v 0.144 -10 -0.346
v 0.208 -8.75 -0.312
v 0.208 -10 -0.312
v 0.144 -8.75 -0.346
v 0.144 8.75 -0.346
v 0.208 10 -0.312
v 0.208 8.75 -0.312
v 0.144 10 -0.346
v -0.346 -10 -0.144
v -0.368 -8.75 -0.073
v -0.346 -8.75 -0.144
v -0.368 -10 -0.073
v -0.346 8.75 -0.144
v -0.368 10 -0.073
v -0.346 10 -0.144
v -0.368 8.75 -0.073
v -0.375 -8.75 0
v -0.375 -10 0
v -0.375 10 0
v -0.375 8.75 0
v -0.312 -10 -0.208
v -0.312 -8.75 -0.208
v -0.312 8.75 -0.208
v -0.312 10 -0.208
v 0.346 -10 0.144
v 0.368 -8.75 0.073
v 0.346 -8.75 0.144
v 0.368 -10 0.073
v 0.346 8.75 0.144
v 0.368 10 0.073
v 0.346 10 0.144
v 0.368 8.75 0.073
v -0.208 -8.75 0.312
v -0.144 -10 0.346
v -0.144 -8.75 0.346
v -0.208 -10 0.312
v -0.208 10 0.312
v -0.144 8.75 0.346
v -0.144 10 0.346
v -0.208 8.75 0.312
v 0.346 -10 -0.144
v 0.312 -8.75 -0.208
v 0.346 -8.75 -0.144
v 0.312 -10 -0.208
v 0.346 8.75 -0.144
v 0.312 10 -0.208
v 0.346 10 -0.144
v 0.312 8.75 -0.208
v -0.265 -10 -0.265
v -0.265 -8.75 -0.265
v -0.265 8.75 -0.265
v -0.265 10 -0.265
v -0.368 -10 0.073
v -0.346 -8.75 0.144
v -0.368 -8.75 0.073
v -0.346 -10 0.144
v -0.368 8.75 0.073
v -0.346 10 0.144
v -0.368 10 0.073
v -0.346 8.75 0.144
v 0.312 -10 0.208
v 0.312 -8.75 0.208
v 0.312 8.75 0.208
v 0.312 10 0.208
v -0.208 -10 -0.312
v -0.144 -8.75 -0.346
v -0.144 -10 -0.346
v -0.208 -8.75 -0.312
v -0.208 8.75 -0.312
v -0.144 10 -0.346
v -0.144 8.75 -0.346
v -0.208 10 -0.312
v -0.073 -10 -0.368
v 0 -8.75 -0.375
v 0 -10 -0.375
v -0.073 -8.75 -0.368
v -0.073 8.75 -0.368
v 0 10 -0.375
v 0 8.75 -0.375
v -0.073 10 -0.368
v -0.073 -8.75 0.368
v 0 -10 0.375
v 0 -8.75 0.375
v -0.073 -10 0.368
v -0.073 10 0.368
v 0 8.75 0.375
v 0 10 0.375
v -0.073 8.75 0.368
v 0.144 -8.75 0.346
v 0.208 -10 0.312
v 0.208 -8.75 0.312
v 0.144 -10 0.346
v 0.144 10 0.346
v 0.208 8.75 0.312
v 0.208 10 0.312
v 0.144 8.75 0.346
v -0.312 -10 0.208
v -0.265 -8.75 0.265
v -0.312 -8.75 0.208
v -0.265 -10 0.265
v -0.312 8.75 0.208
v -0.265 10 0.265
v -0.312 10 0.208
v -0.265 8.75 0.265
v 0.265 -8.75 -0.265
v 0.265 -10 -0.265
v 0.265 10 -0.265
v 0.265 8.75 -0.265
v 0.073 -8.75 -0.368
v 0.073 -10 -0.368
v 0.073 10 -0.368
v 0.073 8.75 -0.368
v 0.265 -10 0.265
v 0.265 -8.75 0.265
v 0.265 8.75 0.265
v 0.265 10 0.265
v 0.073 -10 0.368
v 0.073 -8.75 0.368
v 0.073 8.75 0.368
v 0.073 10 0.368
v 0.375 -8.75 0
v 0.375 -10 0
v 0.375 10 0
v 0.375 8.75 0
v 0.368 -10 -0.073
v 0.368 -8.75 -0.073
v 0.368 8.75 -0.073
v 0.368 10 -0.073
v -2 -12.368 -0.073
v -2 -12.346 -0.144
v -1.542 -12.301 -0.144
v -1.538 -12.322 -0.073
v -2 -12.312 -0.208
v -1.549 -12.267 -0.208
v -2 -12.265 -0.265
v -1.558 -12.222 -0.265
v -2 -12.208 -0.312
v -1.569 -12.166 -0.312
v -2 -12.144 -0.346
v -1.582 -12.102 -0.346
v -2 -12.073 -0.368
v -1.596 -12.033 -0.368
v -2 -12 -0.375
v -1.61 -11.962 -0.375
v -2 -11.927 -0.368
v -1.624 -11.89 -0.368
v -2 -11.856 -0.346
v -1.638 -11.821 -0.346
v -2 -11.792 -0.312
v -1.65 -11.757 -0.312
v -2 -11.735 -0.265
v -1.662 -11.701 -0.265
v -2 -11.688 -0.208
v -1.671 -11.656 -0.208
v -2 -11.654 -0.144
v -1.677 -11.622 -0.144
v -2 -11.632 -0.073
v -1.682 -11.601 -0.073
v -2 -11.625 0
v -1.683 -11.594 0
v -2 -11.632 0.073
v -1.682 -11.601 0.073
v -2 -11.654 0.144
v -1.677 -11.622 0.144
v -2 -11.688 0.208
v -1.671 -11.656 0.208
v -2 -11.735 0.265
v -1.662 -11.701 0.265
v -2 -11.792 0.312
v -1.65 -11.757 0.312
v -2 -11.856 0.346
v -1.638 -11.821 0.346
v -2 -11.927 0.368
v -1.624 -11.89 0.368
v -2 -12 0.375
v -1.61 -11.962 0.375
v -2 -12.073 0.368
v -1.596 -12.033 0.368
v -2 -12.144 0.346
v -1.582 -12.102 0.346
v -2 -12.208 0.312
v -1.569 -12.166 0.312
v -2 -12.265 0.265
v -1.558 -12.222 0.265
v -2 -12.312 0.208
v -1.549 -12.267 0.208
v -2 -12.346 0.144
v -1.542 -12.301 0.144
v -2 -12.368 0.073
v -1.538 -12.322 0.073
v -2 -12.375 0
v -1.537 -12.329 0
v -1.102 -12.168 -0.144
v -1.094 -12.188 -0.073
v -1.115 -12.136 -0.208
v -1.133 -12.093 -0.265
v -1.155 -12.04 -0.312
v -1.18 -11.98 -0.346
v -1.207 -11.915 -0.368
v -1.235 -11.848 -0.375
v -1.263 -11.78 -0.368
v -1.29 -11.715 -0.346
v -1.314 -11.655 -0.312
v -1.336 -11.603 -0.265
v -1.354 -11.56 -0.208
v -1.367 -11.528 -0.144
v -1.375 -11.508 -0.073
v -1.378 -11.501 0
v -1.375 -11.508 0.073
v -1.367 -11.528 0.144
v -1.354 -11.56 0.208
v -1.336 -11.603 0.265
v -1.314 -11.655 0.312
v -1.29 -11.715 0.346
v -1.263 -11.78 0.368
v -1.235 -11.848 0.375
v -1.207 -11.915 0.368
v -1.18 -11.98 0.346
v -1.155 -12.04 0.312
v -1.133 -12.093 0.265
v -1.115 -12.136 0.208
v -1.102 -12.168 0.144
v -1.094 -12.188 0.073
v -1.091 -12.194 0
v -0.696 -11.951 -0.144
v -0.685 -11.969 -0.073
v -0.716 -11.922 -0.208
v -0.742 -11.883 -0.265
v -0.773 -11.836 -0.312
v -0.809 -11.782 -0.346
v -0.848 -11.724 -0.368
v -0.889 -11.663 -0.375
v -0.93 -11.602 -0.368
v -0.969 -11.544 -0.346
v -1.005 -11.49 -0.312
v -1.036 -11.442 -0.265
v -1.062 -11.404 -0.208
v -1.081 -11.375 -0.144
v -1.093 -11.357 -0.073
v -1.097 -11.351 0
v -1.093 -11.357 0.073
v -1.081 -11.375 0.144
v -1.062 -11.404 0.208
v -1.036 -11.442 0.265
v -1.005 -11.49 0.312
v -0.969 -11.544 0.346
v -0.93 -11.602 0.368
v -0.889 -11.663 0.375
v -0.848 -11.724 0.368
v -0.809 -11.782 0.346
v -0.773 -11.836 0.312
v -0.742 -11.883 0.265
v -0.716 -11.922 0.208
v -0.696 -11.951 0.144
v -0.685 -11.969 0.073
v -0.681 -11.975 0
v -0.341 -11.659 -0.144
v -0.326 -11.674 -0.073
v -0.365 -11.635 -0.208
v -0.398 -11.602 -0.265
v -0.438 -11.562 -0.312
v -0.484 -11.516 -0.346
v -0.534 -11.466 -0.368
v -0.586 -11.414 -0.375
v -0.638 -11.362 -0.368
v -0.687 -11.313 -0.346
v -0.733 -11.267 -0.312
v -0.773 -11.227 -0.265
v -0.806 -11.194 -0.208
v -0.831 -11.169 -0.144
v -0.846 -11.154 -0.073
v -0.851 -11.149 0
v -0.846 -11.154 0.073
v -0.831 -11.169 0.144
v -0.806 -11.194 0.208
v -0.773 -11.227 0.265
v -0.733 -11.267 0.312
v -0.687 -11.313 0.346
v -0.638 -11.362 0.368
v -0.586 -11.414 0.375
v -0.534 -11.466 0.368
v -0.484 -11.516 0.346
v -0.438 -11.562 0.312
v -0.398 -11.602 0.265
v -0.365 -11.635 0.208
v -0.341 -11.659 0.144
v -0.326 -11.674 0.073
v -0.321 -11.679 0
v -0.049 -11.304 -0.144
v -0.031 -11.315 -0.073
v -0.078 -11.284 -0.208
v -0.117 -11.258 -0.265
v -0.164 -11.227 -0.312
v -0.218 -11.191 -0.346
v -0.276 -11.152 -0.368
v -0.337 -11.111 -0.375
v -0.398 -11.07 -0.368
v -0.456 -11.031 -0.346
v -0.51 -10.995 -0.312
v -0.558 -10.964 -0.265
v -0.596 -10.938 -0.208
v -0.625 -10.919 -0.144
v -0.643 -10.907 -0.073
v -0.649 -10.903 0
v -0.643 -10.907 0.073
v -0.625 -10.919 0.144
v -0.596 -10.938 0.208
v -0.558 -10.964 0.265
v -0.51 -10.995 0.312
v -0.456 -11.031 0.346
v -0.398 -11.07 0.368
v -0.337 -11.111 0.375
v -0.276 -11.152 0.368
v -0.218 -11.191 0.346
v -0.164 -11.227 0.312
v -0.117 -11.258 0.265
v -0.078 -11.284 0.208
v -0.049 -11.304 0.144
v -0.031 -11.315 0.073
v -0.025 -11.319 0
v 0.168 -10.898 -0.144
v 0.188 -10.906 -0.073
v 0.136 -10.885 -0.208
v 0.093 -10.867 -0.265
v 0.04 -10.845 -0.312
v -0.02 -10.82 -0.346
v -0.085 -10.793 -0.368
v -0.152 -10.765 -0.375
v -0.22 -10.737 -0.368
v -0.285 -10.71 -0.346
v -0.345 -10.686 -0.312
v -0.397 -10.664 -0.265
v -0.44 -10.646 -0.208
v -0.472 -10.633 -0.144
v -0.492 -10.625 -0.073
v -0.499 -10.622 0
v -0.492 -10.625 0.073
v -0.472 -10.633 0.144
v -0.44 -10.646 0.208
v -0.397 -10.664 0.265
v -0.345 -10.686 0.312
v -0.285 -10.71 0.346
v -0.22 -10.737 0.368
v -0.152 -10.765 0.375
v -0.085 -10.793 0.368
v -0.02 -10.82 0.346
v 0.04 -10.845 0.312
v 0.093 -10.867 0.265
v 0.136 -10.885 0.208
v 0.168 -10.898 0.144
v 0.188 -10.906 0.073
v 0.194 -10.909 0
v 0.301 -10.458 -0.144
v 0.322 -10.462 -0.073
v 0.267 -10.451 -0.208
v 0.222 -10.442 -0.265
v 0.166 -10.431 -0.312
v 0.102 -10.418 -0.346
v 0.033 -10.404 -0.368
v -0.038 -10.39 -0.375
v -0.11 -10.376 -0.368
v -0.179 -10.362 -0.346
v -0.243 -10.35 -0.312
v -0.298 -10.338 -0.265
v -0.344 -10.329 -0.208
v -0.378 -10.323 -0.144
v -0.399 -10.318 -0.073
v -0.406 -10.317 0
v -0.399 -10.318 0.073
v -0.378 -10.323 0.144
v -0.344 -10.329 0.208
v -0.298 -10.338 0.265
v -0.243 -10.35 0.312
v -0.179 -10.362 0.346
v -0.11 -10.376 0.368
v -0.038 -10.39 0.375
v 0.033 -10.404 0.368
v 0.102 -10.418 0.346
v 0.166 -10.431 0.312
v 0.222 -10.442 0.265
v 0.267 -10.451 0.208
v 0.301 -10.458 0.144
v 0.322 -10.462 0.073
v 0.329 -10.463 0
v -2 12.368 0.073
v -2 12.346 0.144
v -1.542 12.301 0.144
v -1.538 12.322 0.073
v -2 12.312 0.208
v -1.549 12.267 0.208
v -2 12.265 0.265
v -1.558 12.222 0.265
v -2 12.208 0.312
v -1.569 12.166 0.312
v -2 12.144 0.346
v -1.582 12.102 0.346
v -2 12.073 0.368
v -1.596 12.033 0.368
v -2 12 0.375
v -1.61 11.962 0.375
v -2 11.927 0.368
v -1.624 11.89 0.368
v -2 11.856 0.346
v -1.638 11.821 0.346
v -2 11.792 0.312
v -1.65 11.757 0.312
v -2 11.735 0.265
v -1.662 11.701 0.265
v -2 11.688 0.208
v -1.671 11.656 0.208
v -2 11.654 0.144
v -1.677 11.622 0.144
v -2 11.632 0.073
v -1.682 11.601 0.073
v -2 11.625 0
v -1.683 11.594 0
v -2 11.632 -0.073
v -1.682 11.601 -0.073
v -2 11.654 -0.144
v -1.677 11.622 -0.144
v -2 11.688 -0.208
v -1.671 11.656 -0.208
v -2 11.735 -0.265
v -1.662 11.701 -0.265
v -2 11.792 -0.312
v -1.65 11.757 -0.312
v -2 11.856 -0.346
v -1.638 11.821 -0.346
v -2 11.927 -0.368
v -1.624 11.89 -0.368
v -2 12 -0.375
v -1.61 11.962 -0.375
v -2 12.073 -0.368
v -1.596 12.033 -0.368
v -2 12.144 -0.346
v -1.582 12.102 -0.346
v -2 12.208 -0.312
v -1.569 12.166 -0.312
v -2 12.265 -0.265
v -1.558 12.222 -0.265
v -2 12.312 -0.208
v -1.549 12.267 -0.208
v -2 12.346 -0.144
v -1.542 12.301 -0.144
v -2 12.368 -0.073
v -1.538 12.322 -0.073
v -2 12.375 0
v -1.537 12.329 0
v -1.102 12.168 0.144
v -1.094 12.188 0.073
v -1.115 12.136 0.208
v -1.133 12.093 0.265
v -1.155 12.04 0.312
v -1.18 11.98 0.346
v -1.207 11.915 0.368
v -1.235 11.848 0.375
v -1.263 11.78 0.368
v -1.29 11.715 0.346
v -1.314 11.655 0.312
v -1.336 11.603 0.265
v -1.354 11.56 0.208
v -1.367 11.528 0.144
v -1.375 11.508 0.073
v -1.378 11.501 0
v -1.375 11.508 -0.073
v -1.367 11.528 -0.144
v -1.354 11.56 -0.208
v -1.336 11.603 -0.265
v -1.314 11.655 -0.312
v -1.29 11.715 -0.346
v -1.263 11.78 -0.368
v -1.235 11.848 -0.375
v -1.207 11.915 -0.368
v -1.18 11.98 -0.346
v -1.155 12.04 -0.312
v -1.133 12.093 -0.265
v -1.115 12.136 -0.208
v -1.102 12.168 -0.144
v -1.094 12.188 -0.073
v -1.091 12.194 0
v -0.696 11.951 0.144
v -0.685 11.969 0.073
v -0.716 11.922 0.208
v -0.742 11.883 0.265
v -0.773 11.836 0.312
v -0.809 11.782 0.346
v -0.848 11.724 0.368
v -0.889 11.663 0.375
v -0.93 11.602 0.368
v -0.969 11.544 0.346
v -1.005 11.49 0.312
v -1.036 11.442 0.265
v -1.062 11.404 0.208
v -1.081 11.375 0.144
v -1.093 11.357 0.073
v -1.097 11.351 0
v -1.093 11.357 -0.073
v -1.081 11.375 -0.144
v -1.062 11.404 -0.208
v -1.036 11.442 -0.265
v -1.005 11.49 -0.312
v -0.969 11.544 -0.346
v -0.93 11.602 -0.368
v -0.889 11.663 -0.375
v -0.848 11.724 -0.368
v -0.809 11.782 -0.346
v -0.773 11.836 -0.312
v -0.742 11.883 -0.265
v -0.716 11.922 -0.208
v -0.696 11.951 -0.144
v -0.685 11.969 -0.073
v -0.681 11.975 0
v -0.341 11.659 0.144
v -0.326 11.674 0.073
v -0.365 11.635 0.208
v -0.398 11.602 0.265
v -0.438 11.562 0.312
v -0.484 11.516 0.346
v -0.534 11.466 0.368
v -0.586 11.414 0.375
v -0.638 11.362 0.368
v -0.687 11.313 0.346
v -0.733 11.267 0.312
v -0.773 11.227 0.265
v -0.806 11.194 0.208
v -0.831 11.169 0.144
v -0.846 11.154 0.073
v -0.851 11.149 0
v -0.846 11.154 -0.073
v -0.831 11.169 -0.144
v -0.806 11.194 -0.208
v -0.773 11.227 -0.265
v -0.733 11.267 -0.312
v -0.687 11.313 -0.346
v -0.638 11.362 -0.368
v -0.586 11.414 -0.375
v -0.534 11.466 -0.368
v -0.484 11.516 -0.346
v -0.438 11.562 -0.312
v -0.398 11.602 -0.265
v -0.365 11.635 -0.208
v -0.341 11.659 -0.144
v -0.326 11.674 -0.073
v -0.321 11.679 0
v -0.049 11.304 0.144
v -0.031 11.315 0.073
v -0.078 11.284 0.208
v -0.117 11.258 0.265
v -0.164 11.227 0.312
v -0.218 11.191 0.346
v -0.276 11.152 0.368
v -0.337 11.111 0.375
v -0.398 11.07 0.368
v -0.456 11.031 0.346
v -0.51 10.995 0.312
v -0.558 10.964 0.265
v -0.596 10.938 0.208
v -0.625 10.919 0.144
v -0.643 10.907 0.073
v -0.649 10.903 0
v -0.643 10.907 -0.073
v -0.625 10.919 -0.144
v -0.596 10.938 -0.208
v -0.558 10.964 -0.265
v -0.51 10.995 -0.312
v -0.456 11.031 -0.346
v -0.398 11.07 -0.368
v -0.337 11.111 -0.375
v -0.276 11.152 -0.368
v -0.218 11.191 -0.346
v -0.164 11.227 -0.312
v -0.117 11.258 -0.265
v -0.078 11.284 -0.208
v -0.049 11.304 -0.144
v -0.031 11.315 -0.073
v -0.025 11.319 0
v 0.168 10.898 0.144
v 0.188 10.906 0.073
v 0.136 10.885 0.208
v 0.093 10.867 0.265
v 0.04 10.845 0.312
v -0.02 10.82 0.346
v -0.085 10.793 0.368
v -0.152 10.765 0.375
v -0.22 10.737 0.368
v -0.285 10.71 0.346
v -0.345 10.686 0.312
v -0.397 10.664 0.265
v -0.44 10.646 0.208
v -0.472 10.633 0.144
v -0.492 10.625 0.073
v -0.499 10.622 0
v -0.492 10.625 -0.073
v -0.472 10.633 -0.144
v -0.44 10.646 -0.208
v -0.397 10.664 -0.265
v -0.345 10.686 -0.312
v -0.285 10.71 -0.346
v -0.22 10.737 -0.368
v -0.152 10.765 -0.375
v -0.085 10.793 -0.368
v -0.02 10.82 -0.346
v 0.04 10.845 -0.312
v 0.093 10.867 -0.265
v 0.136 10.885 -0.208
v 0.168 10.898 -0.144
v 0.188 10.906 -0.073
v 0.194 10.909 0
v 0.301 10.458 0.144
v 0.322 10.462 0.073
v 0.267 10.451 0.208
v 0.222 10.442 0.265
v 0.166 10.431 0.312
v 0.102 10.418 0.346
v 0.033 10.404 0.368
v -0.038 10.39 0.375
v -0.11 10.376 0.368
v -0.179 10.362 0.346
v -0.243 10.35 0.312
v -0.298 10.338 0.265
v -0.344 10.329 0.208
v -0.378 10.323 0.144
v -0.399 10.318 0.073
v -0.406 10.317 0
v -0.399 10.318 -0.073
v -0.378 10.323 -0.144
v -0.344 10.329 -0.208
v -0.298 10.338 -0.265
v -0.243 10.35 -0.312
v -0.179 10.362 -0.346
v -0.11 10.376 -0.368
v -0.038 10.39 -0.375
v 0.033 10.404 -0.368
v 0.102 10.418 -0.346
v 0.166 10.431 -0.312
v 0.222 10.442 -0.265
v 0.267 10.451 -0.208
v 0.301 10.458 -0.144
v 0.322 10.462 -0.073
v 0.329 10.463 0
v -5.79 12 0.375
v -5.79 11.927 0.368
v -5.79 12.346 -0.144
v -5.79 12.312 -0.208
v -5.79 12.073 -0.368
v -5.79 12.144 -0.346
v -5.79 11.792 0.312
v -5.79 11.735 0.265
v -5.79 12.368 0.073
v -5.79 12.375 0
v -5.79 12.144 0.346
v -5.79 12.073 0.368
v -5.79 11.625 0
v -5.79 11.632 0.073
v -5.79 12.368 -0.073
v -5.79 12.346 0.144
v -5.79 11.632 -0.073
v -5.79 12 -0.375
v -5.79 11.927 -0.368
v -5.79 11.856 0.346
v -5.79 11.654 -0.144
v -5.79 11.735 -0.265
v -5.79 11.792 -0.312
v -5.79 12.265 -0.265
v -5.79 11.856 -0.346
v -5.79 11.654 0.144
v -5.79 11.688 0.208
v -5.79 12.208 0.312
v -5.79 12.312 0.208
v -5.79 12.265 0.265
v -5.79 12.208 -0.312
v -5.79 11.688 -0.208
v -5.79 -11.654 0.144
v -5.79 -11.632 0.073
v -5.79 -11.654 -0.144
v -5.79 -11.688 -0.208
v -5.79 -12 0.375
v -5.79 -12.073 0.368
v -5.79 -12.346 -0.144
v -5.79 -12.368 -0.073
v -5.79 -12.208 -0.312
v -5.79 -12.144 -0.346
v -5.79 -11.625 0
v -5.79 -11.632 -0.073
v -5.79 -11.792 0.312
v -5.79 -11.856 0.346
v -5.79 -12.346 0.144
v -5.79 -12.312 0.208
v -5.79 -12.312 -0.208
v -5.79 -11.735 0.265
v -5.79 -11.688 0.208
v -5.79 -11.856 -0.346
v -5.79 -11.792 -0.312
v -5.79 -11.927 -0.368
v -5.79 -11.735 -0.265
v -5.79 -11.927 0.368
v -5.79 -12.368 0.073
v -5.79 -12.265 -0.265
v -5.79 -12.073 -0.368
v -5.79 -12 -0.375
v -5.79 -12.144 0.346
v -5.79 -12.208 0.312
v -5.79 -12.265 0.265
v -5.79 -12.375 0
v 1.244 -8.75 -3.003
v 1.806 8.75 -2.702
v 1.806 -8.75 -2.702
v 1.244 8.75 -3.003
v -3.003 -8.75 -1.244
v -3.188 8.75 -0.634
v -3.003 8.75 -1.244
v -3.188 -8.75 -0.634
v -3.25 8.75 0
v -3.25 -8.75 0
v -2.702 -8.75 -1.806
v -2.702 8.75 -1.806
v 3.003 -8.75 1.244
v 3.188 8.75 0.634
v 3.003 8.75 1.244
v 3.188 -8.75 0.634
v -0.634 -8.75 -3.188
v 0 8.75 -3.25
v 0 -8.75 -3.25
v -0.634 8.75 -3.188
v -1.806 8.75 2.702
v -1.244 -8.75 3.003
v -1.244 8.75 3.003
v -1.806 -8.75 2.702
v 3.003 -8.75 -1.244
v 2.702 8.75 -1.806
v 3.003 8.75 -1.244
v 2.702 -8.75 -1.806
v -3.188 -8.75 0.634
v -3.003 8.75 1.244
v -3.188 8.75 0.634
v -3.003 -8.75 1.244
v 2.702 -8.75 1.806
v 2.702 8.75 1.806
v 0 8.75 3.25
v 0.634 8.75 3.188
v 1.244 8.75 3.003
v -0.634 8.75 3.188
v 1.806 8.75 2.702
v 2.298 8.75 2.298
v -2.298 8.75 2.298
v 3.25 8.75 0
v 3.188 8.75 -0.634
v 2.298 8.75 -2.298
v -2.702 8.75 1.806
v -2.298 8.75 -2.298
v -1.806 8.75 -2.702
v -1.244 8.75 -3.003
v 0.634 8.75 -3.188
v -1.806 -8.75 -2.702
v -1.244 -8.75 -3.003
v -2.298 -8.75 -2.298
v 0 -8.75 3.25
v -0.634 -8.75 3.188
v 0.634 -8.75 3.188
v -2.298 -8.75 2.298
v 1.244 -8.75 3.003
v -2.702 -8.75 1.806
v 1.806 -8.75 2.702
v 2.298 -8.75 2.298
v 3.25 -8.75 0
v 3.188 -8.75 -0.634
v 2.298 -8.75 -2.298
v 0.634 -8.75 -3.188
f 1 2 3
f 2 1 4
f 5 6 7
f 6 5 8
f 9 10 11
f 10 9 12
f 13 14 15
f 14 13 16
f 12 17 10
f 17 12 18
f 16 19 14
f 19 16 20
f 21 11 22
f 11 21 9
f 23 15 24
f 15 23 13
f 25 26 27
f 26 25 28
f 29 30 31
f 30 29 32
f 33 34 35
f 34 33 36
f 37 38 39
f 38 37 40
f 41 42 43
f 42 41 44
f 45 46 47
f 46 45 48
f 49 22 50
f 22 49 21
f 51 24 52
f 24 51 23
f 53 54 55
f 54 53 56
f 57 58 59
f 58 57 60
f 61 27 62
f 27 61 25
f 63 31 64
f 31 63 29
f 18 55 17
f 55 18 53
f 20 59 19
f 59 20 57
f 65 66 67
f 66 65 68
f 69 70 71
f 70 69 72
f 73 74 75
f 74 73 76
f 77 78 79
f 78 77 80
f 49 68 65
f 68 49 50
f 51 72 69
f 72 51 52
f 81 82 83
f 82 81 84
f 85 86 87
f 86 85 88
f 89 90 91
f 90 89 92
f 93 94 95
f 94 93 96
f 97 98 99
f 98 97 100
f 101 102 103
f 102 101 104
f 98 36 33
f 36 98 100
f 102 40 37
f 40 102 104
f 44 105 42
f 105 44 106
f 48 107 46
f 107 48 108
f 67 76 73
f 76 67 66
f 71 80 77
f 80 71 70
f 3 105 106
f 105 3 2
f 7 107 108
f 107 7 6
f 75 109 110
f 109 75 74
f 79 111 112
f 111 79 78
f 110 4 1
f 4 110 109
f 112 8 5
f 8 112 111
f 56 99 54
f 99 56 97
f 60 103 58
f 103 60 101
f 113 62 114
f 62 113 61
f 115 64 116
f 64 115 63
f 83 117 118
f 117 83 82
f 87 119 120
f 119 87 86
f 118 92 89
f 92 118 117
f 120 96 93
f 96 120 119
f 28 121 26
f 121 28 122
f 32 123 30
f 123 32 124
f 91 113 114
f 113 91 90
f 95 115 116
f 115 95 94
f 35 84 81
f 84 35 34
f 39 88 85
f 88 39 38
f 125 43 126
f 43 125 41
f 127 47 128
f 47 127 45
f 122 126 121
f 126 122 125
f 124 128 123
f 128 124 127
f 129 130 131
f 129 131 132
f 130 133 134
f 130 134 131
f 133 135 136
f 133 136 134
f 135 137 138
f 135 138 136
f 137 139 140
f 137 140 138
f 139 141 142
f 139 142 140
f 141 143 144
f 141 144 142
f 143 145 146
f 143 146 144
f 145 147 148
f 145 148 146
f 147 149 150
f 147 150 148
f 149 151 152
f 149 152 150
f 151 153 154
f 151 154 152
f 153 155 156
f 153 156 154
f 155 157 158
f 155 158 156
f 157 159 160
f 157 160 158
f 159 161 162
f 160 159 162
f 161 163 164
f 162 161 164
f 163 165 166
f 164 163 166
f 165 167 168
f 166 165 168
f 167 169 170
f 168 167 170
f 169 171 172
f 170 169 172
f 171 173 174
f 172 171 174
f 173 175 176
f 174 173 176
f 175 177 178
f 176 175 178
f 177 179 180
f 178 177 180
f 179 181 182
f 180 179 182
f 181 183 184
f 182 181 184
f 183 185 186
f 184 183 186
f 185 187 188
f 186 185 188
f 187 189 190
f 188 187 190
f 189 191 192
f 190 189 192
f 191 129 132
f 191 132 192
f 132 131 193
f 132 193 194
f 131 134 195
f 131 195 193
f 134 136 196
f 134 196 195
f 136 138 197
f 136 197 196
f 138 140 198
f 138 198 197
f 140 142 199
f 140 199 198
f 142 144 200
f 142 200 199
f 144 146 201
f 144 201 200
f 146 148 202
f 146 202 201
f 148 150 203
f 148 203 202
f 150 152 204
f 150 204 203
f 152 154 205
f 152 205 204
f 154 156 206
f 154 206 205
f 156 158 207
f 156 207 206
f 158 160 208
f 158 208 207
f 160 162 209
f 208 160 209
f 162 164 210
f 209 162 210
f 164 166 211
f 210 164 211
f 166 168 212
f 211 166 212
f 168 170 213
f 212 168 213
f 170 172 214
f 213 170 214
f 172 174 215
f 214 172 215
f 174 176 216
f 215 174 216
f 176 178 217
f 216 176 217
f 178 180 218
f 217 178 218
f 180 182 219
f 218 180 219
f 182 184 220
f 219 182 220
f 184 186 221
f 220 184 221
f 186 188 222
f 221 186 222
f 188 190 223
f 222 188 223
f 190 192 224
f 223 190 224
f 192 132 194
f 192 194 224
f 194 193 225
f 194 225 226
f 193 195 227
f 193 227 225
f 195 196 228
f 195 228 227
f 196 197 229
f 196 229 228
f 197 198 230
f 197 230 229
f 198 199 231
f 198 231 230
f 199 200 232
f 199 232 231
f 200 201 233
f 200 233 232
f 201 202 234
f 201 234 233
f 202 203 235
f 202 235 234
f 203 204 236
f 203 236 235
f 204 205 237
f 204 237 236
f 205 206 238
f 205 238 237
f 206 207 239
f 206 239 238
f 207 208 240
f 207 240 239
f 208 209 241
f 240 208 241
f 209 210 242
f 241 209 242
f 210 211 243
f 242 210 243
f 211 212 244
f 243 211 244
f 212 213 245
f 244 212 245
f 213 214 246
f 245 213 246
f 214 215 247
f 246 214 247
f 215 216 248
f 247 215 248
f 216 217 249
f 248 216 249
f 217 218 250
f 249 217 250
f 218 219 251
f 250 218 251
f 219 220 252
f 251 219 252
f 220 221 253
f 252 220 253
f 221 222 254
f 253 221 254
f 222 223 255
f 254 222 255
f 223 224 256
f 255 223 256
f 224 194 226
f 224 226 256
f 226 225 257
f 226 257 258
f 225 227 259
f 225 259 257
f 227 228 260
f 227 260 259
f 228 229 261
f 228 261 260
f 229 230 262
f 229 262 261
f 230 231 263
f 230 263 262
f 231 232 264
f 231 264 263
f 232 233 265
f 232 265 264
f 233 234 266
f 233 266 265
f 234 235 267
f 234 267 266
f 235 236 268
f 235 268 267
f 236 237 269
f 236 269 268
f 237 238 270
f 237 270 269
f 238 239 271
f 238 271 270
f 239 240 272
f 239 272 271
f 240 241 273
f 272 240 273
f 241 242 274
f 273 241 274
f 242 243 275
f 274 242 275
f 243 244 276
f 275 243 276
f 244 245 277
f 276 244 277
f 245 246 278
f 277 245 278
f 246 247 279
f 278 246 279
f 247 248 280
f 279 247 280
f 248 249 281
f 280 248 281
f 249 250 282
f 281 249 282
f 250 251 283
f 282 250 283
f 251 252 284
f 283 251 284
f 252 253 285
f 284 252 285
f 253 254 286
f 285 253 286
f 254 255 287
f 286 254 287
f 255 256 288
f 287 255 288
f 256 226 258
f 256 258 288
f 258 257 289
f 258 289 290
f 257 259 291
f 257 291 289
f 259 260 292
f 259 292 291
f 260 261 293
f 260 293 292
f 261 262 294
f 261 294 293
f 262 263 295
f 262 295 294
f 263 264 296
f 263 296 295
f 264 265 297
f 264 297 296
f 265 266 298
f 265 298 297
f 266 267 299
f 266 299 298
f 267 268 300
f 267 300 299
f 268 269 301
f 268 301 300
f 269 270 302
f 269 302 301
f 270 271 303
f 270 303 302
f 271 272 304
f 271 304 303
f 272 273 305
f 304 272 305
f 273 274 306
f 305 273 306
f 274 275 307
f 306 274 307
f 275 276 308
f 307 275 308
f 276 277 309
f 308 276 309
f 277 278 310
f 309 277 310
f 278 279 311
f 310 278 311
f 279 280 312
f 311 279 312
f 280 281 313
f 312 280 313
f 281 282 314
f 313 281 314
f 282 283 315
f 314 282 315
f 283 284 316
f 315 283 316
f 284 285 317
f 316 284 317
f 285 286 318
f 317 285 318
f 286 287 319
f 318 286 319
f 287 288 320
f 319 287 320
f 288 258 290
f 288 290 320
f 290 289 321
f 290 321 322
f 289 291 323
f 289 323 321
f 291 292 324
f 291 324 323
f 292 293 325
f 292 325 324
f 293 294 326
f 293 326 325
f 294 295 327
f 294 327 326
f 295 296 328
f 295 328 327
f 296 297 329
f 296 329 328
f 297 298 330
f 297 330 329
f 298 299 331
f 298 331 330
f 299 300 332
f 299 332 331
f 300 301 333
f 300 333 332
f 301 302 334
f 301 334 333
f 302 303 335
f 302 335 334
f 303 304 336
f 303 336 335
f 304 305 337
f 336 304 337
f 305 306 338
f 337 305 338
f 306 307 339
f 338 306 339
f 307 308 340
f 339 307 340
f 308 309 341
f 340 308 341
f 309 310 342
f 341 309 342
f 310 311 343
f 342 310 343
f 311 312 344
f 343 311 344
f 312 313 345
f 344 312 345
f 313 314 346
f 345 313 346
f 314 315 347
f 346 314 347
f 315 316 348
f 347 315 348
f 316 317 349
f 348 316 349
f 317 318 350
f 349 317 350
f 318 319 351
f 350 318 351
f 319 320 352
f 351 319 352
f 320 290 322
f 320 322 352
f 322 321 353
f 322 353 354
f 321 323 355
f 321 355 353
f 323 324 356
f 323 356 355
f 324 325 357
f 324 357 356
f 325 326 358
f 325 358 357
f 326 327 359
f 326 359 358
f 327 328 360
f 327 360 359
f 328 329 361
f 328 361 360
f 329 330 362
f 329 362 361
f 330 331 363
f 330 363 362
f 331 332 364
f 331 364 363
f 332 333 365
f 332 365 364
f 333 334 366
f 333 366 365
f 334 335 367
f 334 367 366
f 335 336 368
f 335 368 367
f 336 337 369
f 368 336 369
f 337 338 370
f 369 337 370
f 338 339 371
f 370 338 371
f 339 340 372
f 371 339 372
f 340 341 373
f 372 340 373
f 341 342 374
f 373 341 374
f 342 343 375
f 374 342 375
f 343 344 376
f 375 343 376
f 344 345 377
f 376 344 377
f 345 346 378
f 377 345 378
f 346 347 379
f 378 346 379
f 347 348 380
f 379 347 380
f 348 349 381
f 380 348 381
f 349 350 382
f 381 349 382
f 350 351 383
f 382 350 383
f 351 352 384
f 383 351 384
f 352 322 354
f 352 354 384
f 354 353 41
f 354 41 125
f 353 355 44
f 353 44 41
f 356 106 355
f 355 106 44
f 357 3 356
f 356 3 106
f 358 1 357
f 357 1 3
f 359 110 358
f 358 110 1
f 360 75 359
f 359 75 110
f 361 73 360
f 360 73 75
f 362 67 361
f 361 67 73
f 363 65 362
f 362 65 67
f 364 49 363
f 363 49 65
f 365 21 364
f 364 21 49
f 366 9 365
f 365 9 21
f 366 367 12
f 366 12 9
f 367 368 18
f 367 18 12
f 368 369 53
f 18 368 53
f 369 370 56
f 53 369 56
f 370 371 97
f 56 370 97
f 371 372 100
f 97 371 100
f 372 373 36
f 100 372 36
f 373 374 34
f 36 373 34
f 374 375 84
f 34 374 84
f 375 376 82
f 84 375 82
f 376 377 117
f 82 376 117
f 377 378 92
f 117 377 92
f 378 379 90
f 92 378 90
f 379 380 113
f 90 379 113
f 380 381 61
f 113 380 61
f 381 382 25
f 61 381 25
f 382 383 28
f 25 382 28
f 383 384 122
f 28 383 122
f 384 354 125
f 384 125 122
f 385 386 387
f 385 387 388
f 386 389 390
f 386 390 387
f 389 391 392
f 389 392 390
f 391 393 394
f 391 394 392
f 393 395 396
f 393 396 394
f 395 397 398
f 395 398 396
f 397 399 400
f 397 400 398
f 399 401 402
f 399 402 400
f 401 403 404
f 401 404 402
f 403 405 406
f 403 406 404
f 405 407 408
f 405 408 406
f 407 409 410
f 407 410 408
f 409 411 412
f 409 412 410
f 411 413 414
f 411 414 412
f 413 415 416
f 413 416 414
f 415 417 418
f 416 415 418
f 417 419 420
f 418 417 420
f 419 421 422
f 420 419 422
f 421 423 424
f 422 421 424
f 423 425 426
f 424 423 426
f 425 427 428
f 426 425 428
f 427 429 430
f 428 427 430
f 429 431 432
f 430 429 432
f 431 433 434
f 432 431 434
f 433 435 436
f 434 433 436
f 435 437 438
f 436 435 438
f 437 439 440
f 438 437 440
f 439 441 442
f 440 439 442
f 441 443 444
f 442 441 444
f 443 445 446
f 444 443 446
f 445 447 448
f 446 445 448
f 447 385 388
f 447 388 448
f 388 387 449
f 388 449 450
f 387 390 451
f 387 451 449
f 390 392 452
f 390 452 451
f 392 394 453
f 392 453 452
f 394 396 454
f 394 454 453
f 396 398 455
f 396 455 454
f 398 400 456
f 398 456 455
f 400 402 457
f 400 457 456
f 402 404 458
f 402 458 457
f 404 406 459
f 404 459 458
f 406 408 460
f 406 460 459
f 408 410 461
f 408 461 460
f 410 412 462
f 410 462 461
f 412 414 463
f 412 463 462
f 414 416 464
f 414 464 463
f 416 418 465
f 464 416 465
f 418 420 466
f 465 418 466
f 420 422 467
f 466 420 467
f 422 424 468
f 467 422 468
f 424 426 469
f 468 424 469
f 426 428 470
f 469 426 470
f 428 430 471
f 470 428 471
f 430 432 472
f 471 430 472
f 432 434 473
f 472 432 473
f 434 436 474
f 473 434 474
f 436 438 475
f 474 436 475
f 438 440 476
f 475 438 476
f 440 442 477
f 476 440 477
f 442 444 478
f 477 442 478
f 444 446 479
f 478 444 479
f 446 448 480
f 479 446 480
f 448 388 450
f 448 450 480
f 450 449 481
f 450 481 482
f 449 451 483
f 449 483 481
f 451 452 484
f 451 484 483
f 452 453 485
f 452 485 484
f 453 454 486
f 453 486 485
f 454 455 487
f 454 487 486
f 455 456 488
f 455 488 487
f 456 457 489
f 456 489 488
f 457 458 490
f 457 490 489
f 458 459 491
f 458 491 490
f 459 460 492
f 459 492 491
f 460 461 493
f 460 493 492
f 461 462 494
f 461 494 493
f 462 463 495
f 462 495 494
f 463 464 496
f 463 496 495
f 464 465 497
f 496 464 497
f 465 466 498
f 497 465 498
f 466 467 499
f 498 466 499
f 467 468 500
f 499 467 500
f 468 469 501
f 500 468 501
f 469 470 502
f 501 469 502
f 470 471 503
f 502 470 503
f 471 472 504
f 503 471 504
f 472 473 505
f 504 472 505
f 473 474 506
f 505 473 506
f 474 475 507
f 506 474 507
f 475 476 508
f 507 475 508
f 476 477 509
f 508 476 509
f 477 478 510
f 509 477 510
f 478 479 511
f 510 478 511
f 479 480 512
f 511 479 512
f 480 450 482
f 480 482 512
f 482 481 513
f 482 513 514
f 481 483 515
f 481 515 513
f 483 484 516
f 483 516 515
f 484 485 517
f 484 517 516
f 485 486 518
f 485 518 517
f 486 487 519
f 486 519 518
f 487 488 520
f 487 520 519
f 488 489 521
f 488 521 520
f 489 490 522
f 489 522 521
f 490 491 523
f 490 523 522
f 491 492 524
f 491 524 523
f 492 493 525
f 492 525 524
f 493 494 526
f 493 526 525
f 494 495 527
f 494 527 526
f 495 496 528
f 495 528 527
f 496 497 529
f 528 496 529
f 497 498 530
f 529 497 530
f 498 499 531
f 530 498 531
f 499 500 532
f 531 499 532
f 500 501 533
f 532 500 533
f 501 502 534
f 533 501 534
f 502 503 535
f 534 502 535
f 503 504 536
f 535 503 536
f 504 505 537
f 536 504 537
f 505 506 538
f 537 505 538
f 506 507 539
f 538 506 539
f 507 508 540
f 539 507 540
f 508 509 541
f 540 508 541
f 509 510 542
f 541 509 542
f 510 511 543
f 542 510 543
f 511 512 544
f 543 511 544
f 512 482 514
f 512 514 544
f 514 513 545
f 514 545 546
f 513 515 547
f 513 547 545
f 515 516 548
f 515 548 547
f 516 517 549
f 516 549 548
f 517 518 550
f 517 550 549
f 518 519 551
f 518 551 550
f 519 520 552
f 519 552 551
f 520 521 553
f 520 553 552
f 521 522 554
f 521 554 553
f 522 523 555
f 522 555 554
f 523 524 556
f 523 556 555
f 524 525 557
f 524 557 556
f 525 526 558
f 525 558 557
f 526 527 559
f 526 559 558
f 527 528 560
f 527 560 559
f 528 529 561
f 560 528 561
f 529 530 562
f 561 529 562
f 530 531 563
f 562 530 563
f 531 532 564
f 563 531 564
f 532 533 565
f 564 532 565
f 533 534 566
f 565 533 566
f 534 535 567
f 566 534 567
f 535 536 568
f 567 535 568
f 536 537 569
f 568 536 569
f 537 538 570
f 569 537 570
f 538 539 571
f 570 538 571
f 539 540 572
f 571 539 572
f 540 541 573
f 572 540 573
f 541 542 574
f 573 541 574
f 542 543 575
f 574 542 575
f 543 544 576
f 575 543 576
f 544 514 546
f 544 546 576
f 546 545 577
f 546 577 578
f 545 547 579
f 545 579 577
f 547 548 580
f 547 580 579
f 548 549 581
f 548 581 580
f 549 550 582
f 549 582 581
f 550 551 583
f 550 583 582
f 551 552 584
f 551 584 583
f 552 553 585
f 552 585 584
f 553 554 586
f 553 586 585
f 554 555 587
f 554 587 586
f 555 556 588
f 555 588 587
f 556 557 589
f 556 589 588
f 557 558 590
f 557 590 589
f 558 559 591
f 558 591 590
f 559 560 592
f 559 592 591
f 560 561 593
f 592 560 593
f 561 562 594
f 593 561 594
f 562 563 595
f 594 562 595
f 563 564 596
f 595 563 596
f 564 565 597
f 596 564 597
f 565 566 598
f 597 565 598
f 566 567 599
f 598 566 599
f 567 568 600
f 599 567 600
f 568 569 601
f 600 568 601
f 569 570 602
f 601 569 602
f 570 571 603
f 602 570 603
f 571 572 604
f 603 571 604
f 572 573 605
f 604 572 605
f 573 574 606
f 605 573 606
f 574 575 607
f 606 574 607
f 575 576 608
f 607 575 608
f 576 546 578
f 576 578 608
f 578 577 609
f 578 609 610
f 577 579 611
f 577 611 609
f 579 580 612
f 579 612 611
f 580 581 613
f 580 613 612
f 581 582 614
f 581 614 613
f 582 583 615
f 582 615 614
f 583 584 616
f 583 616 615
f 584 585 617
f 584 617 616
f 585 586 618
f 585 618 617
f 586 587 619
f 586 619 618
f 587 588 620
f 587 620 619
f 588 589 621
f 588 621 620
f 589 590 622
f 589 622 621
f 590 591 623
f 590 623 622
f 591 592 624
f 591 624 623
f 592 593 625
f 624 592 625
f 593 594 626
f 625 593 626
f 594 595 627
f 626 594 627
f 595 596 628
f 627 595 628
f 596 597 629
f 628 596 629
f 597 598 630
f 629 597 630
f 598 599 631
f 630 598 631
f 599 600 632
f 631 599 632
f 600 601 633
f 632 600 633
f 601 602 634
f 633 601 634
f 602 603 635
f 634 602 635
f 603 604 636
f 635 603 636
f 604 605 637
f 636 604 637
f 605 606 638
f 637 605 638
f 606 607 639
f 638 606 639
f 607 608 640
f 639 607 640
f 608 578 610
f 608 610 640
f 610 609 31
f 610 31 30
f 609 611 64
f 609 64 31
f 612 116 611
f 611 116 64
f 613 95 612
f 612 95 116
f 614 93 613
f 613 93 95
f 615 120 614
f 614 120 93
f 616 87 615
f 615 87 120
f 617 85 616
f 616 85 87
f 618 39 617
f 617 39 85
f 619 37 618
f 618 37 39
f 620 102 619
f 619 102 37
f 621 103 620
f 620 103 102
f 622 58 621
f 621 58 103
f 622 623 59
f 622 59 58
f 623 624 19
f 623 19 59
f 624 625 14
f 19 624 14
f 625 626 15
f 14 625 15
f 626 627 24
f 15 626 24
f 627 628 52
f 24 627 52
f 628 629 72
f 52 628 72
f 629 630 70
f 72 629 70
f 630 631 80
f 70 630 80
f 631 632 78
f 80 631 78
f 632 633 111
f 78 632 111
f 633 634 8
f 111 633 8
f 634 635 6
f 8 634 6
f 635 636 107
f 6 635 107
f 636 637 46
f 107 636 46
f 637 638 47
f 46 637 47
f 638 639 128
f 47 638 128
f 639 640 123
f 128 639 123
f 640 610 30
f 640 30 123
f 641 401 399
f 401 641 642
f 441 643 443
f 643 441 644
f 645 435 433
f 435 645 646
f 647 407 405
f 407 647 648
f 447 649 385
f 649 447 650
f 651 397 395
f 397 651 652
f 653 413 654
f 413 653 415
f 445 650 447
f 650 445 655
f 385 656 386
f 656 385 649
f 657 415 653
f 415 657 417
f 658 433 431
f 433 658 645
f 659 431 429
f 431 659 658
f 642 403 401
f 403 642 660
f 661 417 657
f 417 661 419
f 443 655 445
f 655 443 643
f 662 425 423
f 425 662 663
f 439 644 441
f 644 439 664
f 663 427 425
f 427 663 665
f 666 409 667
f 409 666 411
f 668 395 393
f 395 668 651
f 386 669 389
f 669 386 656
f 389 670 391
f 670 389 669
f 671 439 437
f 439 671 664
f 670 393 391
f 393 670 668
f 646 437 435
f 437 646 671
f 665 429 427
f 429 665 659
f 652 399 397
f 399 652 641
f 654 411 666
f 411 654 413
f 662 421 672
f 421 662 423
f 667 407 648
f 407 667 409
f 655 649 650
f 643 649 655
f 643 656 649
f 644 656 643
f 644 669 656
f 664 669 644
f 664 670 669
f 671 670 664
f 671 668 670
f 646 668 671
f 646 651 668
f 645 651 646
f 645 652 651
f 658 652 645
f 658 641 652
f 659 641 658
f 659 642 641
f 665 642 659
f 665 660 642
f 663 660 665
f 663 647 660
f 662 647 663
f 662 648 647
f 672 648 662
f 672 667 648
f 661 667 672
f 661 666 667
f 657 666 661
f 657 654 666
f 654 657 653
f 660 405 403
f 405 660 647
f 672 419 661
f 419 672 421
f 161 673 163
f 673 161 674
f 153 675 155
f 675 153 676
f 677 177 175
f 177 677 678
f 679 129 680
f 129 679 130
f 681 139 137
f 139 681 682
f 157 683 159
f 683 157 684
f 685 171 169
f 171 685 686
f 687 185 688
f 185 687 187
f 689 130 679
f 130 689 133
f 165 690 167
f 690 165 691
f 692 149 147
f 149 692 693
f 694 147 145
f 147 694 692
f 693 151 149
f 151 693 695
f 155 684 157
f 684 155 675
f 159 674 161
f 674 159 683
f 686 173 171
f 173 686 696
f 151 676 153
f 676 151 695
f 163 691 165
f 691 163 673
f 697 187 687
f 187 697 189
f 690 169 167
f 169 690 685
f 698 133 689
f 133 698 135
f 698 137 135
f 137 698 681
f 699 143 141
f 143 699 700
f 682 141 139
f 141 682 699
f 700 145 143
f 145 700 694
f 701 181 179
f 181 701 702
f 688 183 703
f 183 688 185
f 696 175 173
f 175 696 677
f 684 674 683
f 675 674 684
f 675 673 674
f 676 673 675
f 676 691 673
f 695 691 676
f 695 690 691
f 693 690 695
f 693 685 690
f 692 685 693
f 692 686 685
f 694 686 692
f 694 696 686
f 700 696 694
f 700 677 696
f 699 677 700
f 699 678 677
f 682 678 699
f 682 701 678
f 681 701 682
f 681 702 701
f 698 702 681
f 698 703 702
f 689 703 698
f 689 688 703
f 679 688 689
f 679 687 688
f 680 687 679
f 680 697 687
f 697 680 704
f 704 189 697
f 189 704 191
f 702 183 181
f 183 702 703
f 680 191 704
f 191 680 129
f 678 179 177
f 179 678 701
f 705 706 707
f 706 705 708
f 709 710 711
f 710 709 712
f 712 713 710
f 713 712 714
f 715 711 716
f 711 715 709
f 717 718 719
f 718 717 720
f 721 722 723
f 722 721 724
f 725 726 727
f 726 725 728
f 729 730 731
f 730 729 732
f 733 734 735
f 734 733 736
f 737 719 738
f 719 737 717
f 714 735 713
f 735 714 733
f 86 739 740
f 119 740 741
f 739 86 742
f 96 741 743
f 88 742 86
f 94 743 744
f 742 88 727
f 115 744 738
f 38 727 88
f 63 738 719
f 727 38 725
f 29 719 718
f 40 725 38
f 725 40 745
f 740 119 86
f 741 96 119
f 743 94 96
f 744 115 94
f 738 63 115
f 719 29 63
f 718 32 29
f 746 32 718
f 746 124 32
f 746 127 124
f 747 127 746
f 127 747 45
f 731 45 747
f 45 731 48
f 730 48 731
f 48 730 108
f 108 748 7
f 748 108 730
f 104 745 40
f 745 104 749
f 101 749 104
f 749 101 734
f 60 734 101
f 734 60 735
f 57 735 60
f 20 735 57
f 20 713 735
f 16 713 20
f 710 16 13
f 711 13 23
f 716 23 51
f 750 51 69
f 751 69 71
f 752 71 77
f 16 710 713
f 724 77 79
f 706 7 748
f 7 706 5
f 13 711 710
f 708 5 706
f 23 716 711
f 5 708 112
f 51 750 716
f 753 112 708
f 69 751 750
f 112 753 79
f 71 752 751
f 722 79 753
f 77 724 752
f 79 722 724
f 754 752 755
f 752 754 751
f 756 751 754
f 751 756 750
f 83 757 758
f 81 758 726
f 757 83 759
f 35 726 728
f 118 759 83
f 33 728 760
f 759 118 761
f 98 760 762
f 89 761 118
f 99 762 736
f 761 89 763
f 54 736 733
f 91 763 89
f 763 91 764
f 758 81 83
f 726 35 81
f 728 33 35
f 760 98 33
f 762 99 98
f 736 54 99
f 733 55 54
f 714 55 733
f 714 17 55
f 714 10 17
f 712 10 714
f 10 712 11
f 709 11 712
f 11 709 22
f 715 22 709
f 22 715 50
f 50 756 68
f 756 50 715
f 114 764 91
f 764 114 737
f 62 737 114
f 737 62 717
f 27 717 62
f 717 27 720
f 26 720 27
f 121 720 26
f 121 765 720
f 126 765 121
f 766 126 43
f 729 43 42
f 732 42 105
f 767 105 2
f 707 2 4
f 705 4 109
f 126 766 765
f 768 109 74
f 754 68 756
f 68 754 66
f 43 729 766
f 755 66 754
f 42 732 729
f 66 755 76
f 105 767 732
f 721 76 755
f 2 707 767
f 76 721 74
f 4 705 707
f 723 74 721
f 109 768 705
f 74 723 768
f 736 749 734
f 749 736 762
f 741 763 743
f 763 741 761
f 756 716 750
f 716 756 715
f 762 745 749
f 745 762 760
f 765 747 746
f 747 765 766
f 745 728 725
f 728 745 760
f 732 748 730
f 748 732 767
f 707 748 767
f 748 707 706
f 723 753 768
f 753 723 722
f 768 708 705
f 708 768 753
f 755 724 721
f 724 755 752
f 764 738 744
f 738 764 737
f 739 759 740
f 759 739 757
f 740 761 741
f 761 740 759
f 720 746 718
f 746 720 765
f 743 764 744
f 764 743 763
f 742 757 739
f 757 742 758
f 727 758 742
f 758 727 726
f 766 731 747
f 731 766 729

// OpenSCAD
$fn=32;

length=17.5;
diameter=6.5;
lead_diameter=0.75;
lead_length=3.5;
lead_spacing=24;
curve_distance=2;
lead_below_resistor = 2.54;

module bent_lead() {
  rotate_extrude(angle=90) translate([curve_distance, 0, 0]) circle(d=lead_diameter);
}

rotate([-90, 0, 180]) {
  color("#AAFFFF") cylinder(d=diameter, h=length, center=true);
  color("silver") {
    cylinder(d=lead_diameter, h=lead_spacing - curve_distance * 2, center=true);
    translate([curve_distance, 0, lead_spacing / 2 - curve_distance])
      rotate([0, -90, 90]) bent_lead();
    translate([curve_distance, 0, -lead_spacing / 2 + curve_distance])
      rotate([0, 90, 90]) bent_lead();
    translate([lead_below_resistor + curve_distance / 2 + lead_diameter / 2 - 0.02, 0, -lead_spacing / 2])
      rotate([0, 90, 0])
        cylinder(h=diameter / 2 + lead_below_resistor - curve_distance, d=lead_diameter, center=true);
    translate([lead_below_resistor + curve_distance / 2 + lead_diameter / 2 - 0.02, 0, lead_spacing / 2])
      rotate([0, 90, 0])
        cylinder(h=diameter / 2 + lead_below_resistor - curve_distance, d=lead_diameter, center=true);
  }
}
